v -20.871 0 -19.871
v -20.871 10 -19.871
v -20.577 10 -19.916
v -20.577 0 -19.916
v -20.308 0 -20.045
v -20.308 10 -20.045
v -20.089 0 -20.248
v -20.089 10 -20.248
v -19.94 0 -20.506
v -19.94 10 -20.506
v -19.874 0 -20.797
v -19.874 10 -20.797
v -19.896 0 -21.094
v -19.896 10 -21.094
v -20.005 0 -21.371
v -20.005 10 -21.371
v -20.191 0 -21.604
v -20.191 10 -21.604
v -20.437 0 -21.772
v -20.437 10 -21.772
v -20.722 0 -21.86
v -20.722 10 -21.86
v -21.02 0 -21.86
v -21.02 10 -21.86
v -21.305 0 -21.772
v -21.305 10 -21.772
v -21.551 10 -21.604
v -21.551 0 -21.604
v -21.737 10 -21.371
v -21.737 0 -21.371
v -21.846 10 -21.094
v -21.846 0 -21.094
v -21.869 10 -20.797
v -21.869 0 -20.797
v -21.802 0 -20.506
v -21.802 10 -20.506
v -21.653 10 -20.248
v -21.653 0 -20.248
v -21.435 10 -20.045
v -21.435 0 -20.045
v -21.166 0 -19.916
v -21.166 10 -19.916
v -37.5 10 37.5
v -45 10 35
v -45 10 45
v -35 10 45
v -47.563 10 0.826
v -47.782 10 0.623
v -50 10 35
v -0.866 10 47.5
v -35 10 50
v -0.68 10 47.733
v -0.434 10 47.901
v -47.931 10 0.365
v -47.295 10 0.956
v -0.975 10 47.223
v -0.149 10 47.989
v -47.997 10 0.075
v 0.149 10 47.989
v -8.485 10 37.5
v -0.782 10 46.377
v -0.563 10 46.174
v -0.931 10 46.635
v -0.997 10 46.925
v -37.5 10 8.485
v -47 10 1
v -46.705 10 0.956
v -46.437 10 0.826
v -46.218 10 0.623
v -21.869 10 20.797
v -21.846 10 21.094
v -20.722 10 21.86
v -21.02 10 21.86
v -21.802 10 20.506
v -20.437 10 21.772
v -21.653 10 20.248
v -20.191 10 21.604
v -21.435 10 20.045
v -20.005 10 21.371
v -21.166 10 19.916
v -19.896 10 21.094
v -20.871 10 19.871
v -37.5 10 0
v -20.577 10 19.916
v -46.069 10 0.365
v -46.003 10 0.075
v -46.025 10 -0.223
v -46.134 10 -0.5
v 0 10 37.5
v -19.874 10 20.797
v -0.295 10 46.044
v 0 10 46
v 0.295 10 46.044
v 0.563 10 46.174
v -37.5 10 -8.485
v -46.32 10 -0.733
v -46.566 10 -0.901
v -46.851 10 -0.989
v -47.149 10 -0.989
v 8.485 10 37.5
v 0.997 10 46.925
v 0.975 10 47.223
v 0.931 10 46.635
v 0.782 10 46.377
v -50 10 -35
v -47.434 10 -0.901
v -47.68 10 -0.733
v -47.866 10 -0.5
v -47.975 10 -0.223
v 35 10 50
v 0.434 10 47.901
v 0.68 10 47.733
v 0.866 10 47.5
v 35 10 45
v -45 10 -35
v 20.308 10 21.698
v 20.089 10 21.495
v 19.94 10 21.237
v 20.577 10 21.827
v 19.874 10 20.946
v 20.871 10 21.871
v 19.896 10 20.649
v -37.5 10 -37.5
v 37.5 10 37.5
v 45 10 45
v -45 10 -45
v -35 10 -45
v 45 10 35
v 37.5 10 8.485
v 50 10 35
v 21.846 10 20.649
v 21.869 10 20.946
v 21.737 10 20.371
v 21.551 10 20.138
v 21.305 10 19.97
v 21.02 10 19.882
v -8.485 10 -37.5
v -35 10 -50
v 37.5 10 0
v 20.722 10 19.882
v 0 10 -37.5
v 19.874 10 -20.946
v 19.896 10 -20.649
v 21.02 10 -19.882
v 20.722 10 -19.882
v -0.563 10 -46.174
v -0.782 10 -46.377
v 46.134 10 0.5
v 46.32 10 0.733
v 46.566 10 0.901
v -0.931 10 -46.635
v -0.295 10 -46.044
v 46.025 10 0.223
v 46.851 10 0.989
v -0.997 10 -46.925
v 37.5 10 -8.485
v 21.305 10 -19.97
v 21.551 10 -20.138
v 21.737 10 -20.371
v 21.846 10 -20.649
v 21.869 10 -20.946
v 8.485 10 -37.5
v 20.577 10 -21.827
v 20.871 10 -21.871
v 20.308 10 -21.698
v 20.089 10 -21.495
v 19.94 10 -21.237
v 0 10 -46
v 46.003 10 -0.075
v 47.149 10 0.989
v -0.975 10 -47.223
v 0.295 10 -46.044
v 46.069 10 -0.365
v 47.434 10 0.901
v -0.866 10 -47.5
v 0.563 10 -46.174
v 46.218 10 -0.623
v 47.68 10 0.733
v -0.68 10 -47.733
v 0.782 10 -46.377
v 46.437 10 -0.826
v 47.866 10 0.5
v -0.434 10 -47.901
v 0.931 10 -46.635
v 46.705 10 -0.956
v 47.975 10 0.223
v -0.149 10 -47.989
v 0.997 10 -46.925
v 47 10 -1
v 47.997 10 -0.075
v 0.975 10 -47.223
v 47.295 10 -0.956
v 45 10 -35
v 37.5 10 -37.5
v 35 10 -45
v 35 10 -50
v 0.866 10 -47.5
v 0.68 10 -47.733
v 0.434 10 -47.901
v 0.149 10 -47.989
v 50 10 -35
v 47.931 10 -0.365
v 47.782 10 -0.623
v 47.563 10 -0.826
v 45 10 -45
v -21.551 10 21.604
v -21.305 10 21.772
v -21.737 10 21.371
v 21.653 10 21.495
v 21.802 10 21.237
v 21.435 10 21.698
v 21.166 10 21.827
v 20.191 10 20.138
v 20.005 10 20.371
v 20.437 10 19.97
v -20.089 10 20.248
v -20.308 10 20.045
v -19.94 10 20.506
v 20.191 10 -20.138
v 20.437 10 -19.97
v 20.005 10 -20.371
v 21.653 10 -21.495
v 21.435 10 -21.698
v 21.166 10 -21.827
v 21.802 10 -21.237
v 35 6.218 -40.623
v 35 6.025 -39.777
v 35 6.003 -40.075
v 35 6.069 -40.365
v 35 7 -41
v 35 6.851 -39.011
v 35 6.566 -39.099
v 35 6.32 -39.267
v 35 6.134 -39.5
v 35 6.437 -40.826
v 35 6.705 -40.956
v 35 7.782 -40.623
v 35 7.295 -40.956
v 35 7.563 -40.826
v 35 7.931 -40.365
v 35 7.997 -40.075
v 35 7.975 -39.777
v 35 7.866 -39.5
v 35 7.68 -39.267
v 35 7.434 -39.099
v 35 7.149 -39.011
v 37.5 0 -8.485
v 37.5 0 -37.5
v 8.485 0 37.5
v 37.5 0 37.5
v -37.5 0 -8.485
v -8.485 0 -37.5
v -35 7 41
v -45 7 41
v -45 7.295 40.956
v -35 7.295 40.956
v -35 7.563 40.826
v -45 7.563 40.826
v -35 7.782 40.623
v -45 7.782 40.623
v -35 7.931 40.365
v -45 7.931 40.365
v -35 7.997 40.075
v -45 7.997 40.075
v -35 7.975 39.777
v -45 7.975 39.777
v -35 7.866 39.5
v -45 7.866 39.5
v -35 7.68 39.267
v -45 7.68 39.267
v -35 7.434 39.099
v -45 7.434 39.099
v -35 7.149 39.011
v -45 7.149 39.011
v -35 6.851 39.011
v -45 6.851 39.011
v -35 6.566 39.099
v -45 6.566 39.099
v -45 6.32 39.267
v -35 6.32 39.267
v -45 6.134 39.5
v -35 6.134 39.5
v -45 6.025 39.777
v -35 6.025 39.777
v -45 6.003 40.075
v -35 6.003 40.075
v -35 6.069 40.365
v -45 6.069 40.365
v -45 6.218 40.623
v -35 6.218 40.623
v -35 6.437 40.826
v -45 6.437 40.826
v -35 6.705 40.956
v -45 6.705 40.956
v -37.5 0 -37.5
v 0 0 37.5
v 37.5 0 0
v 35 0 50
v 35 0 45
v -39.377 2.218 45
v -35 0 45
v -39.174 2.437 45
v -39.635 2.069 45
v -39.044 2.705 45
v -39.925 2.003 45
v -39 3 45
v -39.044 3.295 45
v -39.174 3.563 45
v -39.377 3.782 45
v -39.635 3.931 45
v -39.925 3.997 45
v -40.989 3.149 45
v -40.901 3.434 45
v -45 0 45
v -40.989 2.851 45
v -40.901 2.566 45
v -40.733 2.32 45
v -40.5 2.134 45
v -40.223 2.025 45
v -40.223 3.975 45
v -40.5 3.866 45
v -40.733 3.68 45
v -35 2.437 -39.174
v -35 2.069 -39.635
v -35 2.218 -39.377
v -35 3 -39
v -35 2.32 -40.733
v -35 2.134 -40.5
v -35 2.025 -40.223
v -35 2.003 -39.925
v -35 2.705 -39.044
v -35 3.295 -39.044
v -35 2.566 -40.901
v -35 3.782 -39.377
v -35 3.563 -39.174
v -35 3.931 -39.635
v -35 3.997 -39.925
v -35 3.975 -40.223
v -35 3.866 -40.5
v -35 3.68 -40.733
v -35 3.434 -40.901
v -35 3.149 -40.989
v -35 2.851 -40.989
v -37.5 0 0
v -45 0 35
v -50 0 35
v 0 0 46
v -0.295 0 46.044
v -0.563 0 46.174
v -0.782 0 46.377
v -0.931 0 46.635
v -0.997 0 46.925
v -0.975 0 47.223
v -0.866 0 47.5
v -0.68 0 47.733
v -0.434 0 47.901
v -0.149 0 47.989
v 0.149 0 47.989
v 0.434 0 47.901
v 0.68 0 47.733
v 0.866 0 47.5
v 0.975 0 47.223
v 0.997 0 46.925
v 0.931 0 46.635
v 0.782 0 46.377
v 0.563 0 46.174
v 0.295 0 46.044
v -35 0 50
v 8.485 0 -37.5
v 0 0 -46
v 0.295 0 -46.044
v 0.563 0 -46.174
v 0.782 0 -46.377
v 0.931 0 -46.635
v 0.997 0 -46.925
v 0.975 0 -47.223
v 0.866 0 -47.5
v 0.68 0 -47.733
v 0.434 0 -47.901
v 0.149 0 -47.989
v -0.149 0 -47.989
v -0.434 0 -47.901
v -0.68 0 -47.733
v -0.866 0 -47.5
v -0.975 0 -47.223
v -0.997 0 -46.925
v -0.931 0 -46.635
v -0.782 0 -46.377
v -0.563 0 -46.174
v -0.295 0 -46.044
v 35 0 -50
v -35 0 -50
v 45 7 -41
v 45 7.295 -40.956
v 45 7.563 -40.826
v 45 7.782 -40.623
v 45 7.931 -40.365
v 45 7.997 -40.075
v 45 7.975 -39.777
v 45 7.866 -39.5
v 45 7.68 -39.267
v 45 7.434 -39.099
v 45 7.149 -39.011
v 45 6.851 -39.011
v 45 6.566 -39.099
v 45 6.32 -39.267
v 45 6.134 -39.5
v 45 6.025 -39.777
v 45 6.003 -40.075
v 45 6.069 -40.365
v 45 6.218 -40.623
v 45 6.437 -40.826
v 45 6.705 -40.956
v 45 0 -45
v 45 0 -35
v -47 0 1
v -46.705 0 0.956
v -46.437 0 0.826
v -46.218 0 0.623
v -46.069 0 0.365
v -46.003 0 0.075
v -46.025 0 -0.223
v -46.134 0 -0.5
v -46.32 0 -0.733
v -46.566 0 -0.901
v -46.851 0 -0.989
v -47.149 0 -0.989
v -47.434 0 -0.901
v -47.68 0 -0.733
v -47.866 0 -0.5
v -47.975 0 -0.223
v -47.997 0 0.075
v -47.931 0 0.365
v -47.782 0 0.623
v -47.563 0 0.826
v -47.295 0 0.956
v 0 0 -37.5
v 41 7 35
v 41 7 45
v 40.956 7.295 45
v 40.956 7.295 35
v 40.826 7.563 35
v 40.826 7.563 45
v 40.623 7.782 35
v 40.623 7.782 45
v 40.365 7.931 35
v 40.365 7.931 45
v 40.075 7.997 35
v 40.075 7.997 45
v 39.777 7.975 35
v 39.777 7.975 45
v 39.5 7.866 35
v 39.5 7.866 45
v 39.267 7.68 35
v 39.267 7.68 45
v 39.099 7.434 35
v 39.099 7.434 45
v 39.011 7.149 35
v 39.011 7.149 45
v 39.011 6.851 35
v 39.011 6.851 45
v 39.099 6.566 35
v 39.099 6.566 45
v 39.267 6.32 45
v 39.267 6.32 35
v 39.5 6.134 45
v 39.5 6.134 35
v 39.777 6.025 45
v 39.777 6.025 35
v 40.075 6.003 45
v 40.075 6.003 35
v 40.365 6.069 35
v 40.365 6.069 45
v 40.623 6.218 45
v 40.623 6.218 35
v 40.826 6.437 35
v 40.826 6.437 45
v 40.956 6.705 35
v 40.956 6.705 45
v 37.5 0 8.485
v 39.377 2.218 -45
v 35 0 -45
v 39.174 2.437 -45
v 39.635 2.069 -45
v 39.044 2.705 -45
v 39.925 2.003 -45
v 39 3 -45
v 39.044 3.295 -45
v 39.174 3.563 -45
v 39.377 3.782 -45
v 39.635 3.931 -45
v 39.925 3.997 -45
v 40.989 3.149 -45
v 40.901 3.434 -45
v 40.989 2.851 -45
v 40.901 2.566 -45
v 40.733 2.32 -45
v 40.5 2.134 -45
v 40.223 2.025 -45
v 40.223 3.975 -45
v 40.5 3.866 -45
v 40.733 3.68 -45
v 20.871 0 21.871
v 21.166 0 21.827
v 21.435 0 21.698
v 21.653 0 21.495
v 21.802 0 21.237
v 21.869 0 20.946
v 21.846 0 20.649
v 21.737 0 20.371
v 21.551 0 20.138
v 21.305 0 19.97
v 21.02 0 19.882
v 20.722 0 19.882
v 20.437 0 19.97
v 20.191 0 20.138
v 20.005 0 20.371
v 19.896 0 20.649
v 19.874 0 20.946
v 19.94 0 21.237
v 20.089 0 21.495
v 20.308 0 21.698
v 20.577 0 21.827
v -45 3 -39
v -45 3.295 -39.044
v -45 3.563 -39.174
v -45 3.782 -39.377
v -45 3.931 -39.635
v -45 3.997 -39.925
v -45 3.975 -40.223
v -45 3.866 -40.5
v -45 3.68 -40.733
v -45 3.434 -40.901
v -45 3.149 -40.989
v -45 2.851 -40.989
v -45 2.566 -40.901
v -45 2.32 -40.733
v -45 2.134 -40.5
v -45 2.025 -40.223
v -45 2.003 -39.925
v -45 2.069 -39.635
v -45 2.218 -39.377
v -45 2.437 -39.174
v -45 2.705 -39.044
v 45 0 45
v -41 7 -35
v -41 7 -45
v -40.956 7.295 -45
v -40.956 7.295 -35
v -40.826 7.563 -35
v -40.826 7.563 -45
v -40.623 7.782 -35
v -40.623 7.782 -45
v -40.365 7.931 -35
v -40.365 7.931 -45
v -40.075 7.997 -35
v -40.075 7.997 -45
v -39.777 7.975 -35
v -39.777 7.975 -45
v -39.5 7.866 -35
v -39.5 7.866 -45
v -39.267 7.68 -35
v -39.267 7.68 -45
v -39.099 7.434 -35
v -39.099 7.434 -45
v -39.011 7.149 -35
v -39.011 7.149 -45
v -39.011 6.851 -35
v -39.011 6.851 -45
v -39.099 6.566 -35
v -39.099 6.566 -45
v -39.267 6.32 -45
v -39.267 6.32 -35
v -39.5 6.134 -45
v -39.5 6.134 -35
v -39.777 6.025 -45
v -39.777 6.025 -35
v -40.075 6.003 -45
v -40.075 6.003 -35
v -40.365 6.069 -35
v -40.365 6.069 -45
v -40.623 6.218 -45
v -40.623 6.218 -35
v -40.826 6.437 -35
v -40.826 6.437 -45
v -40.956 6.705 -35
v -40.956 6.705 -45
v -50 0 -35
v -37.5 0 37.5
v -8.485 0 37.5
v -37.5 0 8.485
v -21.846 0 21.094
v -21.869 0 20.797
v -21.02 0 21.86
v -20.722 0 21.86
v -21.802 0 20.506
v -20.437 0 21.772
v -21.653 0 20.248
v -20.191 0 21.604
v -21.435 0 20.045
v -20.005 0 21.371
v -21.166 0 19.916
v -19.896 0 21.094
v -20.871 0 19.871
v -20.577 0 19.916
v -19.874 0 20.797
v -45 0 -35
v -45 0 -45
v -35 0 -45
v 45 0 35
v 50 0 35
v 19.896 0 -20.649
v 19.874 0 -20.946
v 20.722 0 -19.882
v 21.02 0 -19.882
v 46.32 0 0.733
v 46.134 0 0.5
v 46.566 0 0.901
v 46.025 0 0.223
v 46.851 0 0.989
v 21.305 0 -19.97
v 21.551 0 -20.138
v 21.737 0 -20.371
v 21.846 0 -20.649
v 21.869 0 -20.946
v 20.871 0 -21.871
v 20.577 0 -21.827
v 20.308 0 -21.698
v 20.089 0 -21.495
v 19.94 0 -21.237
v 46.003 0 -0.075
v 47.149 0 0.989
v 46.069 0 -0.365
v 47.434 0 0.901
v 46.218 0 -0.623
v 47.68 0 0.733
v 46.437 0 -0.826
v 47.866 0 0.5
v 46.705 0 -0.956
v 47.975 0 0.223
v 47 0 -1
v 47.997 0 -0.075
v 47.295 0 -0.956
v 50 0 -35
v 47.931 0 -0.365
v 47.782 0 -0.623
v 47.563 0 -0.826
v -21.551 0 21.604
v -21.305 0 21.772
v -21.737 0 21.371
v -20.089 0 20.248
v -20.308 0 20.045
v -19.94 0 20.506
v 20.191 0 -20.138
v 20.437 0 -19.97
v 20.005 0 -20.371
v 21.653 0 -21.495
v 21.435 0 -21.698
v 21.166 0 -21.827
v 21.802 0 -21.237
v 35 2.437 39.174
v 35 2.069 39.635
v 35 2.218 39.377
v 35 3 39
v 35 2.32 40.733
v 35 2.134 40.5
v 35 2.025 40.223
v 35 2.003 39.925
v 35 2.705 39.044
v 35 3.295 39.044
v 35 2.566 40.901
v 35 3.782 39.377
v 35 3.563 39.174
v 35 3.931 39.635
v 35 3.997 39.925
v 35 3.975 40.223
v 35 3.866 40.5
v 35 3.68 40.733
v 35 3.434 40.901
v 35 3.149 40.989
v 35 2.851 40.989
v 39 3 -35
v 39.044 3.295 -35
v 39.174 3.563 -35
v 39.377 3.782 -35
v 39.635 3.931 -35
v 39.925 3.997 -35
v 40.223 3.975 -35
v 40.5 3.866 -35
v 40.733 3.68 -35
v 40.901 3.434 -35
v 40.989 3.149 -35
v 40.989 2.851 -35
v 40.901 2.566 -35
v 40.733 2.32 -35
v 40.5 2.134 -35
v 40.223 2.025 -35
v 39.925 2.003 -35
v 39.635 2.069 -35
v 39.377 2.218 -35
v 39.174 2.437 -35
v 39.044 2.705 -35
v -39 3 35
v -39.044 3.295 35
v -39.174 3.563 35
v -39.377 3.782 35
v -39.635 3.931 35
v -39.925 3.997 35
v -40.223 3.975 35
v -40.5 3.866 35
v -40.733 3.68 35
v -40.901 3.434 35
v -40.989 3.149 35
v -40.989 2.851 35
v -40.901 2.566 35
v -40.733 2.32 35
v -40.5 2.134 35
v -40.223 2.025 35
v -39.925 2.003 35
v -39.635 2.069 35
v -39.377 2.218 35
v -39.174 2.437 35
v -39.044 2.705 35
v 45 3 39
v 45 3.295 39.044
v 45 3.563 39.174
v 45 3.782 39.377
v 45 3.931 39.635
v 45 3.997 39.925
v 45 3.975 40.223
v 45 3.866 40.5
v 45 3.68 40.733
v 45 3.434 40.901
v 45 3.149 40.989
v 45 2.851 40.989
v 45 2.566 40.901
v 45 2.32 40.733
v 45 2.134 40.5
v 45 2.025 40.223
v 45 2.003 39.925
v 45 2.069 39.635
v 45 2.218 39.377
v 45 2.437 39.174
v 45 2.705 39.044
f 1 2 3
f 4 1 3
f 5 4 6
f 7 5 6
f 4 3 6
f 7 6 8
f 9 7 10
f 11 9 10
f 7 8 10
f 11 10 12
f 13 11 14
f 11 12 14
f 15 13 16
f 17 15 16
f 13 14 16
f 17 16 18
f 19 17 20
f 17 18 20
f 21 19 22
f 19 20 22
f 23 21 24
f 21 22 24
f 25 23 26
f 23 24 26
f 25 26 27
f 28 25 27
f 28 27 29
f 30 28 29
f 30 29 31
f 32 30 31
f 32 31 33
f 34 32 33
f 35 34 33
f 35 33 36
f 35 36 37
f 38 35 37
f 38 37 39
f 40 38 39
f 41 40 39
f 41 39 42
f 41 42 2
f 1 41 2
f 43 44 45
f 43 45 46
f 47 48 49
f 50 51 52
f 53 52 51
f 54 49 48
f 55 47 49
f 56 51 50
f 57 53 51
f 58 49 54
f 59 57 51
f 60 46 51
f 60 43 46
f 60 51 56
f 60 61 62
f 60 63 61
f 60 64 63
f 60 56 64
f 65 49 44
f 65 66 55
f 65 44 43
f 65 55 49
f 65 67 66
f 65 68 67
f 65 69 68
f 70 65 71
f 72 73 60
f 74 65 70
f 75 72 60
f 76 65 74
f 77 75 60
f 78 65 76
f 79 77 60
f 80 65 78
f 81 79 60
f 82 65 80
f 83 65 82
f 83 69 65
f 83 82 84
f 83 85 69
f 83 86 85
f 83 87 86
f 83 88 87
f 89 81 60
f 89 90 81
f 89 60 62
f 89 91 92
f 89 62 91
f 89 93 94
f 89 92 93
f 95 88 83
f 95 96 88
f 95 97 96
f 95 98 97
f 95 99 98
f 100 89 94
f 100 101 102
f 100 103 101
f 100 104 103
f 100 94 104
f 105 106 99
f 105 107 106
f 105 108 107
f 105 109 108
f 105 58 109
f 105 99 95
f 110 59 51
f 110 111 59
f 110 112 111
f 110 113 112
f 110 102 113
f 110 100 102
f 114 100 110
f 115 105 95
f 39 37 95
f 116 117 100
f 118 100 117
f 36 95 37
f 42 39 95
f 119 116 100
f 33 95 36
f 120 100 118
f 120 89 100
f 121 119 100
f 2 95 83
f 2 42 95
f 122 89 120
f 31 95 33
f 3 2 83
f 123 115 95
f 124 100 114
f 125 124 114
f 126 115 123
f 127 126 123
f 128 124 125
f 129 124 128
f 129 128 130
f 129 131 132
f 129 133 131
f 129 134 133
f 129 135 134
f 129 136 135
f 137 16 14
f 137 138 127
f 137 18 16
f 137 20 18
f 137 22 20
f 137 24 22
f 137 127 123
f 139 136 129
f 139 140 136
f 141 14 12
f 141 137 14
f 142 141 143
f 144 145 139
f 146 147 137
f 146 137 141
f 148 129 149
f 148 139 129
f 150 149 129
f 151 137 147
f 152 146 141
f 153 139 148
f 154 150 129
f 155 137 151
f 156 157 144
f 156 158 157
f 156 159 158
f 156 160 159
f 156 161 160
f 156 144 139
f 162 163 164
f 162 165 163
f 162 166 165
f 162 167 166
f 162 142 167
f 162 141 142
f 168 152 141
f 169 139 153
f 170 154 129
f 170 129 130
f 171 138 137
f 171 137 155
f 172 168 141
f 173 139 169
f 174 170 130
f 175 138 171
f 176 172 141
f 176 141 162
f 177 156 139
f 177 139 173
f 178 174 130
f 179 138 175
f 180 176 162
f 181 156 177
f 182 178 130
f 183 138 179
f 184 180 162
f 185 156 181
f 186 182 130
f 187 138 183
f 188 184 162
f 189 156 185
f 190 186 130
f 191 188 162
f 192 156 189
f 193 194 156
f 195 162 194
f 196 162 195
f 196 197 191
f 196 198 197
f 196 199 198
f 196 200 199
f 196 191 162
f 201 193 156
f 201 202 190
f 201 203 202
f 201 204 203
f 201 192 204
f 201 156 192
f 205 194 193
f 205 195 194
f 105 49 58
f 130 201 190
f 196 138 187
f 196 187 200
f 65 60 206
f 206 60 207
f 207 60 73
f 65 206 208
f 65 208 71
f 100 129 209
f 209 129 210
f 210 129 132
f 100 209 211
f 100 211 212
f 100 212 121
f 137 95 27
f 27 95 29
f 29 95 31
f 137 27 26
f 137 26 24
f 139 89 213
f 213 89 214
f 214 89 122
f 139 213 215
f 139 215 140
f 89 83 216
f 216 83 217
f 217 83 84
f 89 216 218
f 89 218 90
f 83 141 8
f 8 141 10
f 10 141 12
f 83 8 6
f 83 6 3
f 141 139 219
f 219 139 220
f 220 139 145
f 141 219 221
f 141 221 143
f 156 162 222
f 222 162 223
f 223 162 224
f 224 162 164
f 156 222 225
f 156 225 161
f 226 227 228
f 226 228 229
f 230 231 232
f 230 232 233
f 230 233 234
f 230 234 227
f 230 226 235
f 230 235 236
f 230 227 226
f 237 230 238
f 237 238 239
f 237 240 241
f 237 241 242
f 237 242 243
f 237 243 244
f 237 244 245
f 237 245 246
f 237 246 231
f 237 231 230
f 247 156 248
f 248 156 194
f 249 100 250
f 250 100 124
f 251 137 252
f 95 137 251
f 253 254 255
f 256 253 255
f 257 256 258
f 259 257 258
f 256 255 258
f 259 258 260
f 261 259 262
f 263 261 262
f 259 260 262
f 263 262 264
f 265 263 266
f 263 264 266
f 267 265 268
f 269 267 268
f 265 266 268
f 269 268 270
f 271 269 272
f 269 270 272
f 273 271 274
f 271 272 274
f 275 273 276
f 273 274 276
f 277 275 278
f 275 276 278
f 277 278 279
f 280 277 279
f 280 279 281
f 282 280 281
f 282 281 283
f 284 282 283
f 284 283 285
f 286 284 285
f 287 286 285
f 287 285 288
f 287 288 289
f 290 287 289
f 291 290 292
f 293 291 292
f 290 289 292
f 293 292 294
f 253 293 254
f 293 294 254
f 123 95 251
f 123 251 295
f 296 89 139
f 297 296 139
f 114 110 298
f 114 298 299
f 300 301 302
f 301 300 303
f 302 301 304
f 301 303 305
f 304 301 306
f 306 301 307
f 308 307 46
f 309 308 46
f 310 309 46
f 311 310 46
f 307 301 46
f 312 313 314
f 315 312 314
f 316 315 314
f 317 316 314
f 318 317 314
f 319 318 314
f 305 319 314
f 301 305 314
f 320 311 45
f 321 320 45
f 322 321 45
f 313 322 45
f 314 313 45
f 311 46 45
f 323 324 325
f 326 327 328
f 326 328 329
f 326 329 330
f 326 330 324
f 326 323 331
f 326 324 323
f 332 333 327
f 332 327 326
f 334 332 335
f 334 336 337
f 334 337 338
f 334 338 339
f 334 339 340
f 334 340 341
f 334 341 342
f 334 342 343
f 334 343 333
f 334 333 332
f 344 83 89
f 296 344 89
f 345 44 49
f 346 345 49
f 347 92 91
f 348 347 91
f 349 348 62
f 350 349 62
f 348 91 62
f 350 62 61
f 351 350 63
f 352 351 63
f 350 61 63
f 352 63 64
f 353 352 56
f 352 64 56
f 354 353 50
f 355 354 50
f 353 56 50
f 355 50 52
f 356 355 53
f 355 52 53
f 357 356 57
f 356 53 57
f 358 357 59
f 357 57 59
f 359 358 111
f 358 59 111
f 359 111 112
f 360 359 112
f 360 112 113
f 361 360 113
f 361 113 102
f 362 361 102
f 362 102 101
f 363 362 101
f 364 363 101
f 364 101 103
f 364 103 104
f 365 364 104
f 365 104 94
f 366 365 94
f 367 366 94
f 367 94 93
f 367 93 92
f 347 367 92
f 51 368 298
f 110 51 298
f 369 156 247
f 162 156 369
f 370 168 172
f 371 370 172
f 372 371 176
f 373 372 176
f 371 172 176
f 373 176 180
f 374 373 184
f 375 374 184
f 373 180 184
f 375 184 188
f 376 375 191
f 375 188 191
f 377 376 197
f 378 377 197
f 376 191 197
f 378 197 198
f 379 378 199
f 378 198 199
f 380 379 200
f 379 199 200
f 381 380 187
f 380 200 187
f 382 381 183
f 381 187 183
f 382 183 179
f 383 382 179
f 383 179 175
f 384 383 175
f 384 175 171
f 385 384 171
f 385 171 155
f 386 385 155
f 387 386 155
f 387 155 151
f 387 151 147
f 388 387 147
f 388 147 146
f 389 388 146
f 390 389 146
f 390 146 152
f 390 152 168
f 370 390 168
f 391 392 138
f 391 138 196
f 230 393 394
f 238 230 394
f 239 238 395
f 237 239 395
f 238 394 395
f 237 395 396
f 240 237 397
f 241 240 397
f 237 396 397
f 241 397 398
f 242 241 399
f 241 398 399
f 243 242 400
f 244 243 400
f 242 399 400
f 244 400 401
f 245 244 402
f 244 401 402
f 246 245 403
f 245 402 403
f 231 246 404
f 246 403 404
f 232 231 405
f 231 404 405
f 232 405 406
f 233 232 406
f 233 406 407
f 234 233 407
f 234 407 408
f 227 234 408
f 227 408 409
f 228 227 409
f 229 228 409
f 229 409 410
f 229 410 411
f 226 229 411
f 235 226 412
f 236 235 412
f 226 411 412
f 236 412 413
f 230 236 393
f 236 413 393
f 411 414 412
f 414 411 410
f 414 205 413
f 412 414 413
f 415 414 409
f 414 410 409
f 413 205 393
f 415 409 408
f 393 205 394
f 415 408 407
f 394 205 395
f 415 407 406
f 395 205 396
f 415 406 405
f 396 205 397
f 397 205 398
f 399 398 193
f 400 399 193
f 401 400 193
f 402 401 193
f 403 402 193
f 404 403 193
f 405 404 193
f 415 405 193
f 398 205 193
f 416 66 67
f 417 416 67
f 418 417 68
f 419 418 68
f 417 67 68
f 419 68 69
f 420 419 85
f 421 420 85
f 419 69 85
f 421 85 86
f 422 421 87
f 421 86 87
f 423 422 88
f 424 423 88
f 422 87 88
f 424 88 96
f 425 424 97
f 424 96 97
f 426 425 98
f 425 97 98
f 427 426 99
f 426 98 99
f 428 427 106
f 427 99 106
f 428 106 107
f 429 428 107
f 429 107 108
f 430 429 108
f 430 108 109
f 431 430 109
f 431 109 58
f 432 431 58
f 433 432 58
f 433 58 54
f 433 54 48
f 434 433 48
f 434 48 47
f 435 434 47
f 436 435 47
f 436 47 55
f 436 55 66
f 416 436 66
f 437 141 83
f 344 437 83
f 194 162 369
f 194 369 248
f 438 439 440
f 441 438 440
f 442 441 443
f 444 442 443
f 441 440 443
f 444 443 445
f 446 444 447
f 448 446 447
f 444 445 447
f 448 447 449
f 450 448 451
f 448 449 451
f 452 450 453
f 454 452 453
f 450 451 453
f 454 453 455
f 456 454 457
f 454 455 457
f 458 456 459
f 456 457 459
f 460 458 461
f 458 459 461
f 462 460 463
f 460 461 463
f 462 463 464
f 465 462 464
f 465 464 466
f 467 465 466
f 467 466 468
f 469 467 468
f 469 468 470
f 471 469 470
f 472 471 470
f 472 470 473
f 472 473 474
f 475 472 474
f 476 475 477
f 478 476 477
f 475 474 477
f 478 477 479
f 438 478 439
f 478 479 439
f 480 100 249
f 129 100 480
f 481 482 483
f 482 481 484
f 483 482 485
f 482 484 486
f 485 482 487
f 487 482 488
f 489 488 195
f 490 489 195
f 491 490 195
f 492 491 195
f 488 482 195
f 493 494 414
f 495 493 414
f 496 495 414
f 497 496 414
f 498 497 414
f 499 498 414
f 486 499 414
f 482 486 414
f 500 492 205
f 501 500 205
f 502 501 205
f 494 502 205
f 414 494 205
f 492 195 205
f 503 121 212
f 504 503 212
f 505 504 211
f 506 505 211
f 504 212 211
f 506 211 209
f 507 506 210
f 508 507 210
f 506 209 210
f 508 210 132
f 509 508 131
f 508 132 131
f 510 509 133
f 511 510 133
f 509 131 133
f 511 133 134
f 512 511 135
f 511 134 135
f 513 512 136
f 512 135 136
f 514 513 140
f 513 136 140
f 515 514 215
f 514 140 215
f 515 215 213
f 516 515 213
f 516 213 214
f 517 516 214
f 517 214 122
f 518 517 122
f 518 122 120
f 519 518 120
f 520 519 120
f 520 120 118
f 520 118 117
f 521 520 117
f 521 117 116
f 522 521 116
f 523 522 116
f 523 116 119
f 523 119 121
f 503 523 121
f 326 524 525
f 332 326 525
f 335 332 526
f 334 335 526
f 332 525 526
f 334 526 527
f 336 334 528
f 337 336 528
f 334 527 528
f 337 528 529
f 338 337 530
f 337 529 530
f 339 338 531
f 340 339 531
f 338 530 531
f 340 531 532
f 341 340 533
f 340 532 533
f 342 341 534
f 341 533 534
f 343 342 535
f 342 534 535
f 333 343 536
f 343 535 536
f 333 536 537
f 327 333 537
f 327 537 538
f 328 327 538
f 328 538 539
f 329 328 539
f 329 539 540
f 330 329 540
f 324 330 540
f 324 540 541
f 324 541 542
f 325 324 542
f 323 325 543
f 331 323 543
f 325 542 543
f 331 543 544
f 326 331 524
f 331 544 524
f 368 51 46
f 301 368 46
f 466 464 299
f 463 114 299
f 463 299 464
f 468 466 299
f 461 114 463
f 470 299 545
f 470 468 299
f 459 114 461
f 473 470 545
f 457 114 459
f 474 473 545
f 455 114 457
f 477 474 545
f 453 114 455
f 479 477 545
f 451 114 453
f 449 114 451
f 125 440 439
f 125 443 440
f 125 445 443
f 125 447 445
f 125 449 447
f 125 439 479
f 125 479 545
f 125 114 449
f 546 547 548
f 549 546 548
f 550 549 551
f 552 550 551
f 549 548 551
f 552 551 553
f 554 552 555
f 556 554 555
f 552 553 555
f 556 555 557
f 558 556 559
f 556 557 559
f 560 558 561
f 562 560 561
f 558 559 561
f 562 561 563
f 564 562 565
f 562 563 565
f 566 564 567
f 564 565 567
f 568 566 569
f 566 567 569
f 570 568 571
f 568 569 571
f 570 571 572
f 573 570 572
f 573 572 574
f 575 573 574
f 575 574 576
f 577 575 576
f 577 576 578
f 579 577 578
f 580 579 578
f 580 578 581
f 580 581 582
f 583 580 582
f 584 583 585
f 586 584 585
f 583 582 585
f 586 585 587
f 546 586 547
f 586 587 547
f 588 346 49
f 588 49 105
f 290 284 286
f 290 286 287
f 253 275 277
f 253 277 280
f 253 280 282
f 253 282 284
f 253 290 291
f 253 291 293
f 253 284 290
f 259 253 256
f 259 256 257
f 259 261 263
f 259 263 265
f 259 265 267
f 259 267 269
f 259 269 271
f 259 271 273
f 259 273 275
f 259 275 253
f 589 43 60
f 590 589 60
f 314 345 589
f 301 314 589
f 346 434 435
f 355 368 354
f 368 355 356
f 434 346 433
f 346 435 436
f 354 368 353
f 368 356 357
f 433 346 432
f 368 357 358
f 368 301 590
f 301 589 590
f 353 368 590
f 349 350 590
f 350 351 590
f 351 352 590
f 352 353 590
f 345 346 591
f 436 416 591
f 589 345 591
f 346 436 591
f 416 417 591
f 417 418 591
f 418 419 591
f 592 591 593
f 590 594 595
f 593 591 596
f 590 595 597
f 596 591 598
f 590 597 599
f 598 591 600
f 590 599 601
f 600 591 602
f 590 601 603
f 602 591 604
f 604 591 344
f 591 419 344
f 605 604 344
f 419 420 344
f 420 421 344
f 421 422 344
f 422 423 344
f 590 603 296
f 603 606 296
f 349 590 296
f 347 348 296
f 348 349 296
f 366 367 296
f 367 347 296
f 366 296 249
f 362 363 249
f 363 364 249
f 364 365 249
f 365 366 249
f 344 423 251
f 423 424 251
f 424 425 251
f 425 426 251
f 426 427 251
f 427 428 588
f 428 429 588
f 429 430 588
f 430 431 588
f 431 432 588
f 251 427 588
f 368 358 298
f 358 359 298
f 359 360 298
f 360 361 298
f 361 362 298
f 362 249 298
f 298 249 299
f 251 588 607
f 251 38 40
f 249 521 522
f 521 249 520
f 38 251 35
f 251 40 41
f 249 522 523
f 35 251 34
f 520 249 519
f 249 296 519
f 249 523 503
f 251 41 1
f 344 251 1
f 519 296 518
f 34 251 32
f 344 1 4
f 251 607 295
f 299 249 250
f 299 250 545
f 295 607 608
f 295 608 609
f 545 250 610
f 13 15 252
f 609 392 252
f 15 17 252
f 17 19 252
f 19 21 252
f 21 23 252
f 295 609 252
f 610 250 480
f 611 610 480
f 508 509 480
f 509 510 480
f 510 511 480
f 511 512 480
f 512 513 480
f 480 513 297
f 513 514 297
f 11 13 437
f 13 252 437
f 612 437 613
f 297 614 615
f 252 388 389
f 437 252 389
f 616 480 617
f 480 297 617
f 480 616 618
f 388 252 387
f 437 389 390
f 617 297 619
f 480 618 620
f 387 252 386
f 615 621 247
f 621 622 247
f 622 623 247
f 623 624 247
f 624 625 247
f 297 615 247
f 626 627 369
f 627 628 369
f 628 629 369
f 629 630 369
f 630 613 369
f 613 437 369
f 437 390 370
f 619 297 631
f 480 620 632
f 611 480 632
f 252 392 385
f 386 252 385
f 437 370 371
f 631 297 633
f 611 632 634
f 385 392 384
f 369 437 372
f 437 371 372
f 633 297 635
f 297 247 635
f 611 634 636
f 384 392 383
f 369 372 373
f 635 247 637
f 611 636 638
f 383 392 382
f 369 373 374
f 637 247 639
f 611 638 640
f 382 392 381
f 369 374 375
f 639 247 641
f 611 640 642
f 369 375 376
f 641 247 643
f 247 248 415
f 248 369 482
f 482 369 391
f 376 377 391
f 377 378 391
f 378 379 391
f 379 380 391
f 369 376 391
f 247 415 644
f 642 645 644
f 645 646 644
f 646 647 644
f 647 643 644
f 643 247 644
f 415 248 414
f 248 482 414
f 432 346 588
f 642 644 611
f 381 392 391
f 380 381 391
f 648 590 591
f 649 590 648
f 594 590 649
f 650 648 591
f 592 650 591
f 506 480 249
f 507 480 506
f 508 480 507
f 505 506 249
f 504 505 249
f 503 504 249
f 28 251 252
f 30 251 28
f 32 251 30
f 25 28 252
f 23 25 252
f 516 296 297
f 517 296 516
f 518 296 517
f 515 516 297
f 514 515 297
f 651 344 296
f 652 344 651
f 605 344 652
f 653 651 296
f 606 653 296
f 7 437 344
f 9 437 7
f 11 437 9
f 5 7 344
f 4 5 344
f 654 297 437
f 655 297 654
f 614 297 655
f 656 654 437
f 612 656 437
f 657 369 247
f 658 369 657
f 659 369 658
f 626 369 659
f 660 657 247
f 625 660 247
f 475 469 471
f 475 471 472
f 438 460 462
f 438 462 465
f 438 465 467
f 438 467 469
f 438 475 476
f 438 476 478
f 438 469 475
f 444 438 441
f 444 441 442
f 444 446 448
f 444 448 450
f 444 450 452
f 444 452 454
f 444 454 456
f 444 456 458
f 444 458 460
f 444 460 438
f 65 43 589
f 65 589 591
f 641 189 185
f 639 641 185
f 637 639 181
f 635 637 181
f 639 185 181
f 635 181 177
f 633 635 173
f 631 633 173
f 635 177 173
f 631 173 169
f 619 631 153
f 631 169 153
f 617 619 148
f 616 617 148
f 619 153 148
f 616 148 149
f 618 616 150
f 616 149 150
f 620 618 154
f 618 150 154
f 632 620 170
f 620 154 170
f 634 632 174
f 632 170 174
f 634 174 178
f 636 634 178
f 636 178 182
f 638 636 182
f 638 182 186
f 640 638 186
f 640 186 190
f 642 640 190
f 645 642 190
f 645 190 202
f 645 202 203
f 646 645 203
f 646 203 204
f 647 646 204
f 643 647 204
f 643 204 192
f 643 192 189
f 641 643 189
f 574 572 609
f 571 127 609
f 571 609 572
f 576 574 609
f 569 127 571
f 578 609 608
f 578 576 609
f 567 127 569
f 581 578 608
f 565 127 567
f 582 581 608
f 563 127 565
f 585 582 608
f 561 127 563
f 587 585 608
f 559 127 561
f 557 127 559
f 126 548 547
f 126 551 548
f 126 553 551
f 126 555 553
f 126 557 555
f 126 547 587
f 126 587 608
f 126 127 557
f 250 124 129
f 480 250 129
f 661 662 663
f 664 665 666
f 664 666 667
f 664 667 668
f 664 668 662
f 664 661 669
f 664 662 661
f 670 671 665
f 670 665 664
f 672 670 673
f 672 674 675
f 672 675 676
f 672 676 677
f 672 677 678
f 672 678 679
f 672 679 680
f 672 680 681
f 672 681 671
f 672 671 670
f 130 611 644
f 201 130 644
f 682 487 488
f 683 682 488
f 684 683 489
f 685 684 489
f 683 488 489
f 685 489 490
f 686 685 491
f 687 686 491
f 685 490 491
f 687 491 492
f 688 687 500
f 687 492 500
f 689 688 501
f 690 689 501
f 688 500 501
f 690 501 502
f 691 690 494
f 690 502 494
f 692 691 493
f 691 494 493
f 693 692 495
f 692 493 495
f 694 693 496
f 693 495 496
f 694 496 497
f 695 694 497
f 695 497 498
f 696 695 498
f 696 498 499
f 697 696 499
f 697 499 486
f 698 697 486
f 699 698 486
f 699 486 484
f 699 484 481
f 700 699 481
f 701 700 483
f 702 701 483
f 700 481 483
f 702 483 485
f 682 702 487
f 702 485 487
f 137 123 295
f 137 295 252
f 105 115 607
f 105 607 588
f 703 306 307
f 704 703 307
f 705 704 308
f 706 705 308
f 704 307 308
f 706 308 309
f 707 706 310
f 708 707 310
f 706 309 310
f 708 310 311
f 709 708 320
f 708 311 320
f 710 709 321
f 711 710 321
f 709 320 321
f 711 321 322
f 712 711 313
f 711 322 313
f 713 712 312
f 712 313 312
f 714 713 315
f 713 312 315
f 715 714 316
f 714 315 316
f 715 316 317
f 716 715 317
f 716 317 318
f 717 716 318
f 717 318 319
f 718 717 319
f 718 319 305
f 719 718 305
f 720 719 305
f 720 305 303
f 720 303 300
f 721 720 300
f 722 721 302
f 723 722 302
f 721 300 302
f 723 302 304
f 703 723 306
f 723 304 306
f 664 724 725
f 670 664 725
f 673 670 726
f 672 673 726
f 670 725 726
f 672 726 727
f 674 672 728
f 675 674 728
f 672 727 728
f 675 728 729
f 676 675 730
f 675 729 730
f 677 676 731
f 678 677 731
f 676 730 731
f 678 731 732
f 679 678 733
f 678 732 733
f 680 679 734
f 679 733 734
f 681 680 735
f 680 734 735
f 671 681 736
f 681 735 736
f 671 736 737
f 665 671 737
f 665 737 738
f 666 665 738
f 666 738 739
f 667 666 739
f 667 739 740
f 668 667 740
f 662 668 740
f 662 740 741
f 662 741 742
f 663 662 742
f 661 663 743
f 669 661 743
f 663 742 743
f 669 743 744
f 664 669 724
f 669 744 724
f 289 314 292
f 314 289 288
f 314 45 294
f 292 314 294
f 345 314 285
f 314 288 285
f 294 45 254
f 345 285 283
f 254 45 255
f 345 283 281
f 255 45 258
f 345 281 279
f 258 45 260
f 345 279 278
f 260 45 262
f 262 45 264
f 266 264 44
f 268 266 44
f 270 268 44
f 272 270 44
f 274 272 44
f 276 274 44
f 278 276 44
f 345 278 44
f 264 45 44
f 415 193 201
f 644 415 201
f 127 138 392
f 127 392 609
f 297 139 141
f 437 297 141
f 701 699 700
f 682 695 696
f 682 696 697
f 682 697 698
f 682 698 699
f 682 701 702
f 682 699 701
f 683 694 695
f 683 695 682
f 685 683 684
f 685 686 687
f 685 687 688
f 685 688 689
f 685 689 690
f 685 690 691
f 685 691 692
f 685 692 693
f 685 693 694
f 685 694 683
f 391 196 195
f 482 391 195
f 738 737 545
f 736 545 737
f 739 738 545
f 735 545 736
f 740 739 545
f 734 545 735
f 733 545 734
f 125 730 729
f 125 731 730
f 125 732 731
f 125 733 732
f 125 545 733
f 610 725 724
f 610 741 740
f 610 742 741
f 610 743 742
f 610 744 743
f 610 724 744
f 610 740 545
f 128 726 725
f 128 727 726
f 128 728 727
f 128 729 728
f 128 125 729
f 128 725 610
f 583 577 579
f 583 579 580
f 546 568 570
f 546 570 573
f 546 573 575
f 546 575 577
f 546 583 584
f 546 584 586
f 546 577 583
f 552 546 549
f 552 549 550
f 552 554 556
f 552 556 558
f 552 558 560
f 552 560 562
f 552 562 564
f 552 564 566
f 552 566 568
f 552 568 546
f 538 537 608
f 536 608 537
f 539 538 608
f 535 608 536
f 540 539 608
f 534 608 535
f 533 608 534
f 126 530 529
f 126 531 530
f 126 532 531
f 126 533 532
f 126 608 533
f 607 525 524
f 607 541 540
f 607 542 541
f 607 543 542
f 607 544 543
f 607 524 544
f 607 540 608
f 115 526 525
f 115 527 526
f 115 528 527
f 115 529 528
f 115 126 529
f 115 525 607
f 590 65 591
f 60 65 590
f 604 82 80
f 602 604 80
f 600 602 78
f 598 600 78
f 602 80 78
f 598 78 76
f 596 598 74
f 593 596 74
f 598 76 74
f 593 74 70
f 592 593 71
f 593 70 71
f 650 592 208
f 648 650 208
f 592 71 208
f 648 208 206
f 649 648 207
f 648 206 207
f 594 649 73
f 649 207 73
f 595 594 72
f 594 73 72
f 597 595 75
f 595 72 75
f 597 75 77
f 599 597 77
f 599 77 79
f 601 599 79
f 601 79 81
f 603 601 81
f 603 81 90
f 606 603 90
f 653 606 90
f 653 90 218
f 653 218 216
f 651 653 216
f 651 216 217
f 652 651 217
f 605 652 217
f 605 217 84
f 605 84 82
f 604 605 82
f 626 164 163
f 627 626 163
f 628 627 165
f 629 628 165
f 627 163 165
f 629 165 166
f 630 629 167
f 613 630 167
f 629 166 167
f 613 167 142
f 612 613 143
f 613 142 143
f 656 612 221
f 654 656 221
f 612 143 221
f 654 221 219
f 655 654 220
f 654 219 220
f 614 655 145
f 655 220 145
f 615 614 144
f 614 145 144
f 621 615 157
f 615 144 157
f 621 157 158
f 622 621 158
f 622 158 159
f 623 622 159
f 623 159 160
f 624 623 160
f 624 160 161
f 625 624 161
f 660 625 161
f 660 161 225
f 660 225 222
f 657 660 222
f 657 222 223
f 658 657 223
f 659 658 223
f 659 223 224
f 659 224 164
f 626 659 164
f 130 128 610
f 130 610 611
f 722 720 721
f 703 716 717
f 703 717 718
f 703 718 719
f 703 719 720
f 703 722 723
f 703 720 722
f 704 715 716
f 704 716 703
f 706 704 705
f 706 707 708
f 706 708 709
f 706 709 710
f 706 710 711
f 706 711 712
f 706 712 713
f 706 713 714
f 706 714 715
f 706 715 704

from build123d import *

# Parameters (mm, degrees)
SKETCH1_W           = 100
SKETCH1_H           = 100
BOSS_EXTRUDE1_DEPTH = 10
CUT_EXTRUDE1_DEPTH  = 72.414284285
SKETCH3_W           = 75
SKETCH3_H           = 75
CUT_EXTRUDE2_DEPTH  = 10
BOSS_EXTRUDE2_DEPTH = 10
SKETCH10_R          = 1
CUT_EXTRUDE7_DEPTH  = 72.414284285
SKETCH11_R          = 1
CUT_EXTRUDE8_DEPTH  = 72.414284285
SKETCH12_R          = 1
CUT_EXTRUDE9_DEPTH  = 72.414284285
SKETCH9_R           = 1
CUT_EXTRUDE11_DEPTH = 10
SKETCH13_R          = 1
CUT_EXTRUDE12_DEPTH = 10
SKETCH14_R          = 1
CUT_EXTRUDE13_DEPTH = 10
SKETCH15_R          = 1
CUT_EXTRUDE14_DEPTH = 10
SKETCH16_R          = 1
CUT_EXTRUDE15_DEPTH = 10
SKETCH17_R          = 1
CUT_EXTRUDE16_DEPTH = 10
SKETCH18_R          = 1
CUT_EXTRUDE17_DEPTH = 10
SKETCH19_R          = 1
CUT_EXTRUDE18_DEPTH = 10


with BuildPart() as part:
    # Sketch1 → Boss-Extrude1 (new body)
    with BuildSketch(Plane(origin=(0, 0, 0), x_dir=(1, 0, 0), z_dir=(0, 1, 0))):
        Rectangle(SKETCH1_W, SKETCH1_H)
    extrude(amount=BOSS_EXTRUDE1_DEPTH)

    # Sketch2 → Cut-Extrude1 (cut, through all)
    with BuildSketch(Plane(origin=(0, 10, 0), x_dir=(1, 0, 0), z_dir=(0, 1, 0))):
        Polygon((35, 50), (35, 45), (45, 45), (45, 35), (50, 35), (50, 50), align=None)
        Polygon((-45, 35), (-50, 35), (-50, 50), (-35, 50), (-35, 45), (-45, 45), align=None)
        Polygon((-45, -35), (-50, -35), (-50, -50), (-35, -50), (-35, -45), (-45, -45), align=None)
        Polygon((35, -50), (35, -45), (45, -45), (45, -35), (50, -35), (50, -50), align=None)
    extrude(amount=-CUT_EXTRUDE1_DEPTH, mode=Mode.SUBTRACT)

    # Sketch3 → Cut-Extrude2 (cut)
    with BuildSketch(Plane(origin=(0, 10, 0), x_dir=(1, 0, 0), z_dir=(0, 1, 0))):
        Rectangle(SKETCH3_W, SKETCH3_H)
    extrude(amount=-CUT_EXTRUDE2_DEPTH, mode=Mode.SUBTRACT)

    # Sketch4 → Boss-Extrude2 (add)
    with BuildSketch(Plane(origin=(0, 10, 0), x_dir=(1, 0, 0), z_dir=(0, 1, 0))):
        Polygon((45.985281374, 0), (0, 45.985281374), (-45.985281374, 0), (0, -45.985281374), align=None)
        Polygon((0, 37.5), (-37.5, 0), (0, -37.5), (37.5, 0), align=None, mode=Mode.SUBTRACT)
    extrude(amount=-BOSS_EXTRUDE2_DEPTH)

    # Sketch10 → Cut-Extrude7 (cut, through all)
    with BuildSketch(Plane(origin=(0, 10, 0), x_dir=(1, 0, 0), z_dir=(0, 1, 0))):
        with Locations(Location((0, 47, 0), (0, 0, 270))):
            Circle(SKETCH10_R)
        with Locations(Location((0, -47, 0), (0, 0, 90))):
            Circle(SKETCH10_R)
    extrude(amount=-CUT_EXTRUDE7_DEPTH, mode=Mode.SUBTRACT)

    # Sketch11 → Cut-Extrude8 (cut, through all)
    with BuildSketch(Plane(origin=(0, 10, 0), x_dir=(1, 0, 0), z_dir=(0, 1, 0))):
        with Locations(Location((-47, 0, 0), (0, 0, 270))):
            Circle(SKETCH11_R)
        with Locations(Location((47, 0, 0), (0, 0, 90))):
            Circle(SKETCH11_R)
    extrude(amount=-CUT_EXTRUDE8_DEPTH, mode=Mode.SUBTRACT)

    # Sketch12 → Cut-Extrude9 (cut, through all)
    with BuildSketch(Plane(origin=(0, 10, 0), x_dir=(1, 0, 0), z_dir=(0, 1, 0))):
        with Locations(Location((-20.871320344, 20.871320344, 0), (0, 0, 270))):
            Circle(SKETCH12_R)
        with Locations(Location((20.871320344, 20.871320344, 0), (0, 0, 90))):
            Circle(SKETCH12_R)
        with Locations(Location((20.871320344, -20.871320344, 0), (0, 0, 270))):
            Circle(SKETCH12_R)
        with Locations(Location((-20.871320344, -20.871320344, 0), (0, 0, 90))):
            Circle(SKETCH12_R)
    extrude(amount=-CUT_EXTRUDE9_DEPTH, mode=Mode.SUBTRACT)

    # Sketch9 → Cut-Extrude11 (cut)
    with BuildSketch(Plane.ZY.offset(45)):
        with Locations((-40, 3)):
            Circle(SKETCH9_R)
    extrude(amount=-CUT_EXTRUDE11_DEPTH, mode=Mode.SUBTRACT)

    # Sketch13 → Cut-Extrude12 (cut)
    with BuildSketch(Plane(origin=(0, 0, -45), x_dir=(-1, 0, 0), z_dir=(0, 0, -1))):
        with Locations((40, 7)):
            Circle(SKETCH13_R)
    extrude(amount=-CUT_EXTRUDE12_DEPTH, mode=Mode.SUBTRACT)

    # Sketch14 → Cut-Extrude13 (cut)
    with BuildSketch(Plane.ZY.offset(45)):
        with Locations((40, 7)):
            Circle(SKETCH14_R)
    extrude(amount=-CUT_EXTRUDE13_DEPTH, mode=Mode.SUBTRACT)

    # Sketch15 → Cut-Extrude14 (cut)
    with BuildSketch(Plane.XY.offset(45)):
        with Locations((-40, 3)):
            Circle(SKETCH15_R)
    extrude(amount=-CUT_EXTRUDE14_DEPTH, mode=Mode.SUBTRACT)

    # Sketch16 → Cut-Extrude15 (cut)
    with BuildSketch(Plane.XY.offset(45)):
        with Locations((40, 7)):
            Circle(SKETCH16_R)
    extrude(amount=-CUT_EXTRUDE15_DEPTH, mode=Mode.SUBTRACT)

    # Sketch17 → Cut-Extrude16 (cut)
    with BuildSketch(Plane(origin=(45, 0, 0), x_dir=(0, 0, -1), z_dir=(1, 0, 0))):
        with Locations((-40, 3)):
            Circle(SKETCH17_R)
    extrude(amount=-CUT_EXTRUDE16_DEPTH, mode=Mode.SUBTRACT)

    # Sketch18 → Cut-Extrude17 (cut)
    with BuildSketch(Plane(origin=(45, 0, 0), x_dir=(0, 0, -1), z_dir=(1, 0, 0))):
        with Locations((40, 7)):
            Circle(SKETCH18_R)
    extrude(amount=-CUT_EXTRUDE17_DEPTH, mode=Mode.SUBTRACT)

    # Sketch19 → Cut-Extrude18 (cut)
    with BuildSketch(Plane(origin=(0, 0, -45), x_dir=(-1, 0, 0), z_dir=(0, 0, -1))):
        with Locations((-40, 3)):
            Circle(SKETCH19_R)
    extrude(amount=-CUT_EXTRUDE18_DEPTH, mode=Mode.SUBTRACT)


solid = part.part
